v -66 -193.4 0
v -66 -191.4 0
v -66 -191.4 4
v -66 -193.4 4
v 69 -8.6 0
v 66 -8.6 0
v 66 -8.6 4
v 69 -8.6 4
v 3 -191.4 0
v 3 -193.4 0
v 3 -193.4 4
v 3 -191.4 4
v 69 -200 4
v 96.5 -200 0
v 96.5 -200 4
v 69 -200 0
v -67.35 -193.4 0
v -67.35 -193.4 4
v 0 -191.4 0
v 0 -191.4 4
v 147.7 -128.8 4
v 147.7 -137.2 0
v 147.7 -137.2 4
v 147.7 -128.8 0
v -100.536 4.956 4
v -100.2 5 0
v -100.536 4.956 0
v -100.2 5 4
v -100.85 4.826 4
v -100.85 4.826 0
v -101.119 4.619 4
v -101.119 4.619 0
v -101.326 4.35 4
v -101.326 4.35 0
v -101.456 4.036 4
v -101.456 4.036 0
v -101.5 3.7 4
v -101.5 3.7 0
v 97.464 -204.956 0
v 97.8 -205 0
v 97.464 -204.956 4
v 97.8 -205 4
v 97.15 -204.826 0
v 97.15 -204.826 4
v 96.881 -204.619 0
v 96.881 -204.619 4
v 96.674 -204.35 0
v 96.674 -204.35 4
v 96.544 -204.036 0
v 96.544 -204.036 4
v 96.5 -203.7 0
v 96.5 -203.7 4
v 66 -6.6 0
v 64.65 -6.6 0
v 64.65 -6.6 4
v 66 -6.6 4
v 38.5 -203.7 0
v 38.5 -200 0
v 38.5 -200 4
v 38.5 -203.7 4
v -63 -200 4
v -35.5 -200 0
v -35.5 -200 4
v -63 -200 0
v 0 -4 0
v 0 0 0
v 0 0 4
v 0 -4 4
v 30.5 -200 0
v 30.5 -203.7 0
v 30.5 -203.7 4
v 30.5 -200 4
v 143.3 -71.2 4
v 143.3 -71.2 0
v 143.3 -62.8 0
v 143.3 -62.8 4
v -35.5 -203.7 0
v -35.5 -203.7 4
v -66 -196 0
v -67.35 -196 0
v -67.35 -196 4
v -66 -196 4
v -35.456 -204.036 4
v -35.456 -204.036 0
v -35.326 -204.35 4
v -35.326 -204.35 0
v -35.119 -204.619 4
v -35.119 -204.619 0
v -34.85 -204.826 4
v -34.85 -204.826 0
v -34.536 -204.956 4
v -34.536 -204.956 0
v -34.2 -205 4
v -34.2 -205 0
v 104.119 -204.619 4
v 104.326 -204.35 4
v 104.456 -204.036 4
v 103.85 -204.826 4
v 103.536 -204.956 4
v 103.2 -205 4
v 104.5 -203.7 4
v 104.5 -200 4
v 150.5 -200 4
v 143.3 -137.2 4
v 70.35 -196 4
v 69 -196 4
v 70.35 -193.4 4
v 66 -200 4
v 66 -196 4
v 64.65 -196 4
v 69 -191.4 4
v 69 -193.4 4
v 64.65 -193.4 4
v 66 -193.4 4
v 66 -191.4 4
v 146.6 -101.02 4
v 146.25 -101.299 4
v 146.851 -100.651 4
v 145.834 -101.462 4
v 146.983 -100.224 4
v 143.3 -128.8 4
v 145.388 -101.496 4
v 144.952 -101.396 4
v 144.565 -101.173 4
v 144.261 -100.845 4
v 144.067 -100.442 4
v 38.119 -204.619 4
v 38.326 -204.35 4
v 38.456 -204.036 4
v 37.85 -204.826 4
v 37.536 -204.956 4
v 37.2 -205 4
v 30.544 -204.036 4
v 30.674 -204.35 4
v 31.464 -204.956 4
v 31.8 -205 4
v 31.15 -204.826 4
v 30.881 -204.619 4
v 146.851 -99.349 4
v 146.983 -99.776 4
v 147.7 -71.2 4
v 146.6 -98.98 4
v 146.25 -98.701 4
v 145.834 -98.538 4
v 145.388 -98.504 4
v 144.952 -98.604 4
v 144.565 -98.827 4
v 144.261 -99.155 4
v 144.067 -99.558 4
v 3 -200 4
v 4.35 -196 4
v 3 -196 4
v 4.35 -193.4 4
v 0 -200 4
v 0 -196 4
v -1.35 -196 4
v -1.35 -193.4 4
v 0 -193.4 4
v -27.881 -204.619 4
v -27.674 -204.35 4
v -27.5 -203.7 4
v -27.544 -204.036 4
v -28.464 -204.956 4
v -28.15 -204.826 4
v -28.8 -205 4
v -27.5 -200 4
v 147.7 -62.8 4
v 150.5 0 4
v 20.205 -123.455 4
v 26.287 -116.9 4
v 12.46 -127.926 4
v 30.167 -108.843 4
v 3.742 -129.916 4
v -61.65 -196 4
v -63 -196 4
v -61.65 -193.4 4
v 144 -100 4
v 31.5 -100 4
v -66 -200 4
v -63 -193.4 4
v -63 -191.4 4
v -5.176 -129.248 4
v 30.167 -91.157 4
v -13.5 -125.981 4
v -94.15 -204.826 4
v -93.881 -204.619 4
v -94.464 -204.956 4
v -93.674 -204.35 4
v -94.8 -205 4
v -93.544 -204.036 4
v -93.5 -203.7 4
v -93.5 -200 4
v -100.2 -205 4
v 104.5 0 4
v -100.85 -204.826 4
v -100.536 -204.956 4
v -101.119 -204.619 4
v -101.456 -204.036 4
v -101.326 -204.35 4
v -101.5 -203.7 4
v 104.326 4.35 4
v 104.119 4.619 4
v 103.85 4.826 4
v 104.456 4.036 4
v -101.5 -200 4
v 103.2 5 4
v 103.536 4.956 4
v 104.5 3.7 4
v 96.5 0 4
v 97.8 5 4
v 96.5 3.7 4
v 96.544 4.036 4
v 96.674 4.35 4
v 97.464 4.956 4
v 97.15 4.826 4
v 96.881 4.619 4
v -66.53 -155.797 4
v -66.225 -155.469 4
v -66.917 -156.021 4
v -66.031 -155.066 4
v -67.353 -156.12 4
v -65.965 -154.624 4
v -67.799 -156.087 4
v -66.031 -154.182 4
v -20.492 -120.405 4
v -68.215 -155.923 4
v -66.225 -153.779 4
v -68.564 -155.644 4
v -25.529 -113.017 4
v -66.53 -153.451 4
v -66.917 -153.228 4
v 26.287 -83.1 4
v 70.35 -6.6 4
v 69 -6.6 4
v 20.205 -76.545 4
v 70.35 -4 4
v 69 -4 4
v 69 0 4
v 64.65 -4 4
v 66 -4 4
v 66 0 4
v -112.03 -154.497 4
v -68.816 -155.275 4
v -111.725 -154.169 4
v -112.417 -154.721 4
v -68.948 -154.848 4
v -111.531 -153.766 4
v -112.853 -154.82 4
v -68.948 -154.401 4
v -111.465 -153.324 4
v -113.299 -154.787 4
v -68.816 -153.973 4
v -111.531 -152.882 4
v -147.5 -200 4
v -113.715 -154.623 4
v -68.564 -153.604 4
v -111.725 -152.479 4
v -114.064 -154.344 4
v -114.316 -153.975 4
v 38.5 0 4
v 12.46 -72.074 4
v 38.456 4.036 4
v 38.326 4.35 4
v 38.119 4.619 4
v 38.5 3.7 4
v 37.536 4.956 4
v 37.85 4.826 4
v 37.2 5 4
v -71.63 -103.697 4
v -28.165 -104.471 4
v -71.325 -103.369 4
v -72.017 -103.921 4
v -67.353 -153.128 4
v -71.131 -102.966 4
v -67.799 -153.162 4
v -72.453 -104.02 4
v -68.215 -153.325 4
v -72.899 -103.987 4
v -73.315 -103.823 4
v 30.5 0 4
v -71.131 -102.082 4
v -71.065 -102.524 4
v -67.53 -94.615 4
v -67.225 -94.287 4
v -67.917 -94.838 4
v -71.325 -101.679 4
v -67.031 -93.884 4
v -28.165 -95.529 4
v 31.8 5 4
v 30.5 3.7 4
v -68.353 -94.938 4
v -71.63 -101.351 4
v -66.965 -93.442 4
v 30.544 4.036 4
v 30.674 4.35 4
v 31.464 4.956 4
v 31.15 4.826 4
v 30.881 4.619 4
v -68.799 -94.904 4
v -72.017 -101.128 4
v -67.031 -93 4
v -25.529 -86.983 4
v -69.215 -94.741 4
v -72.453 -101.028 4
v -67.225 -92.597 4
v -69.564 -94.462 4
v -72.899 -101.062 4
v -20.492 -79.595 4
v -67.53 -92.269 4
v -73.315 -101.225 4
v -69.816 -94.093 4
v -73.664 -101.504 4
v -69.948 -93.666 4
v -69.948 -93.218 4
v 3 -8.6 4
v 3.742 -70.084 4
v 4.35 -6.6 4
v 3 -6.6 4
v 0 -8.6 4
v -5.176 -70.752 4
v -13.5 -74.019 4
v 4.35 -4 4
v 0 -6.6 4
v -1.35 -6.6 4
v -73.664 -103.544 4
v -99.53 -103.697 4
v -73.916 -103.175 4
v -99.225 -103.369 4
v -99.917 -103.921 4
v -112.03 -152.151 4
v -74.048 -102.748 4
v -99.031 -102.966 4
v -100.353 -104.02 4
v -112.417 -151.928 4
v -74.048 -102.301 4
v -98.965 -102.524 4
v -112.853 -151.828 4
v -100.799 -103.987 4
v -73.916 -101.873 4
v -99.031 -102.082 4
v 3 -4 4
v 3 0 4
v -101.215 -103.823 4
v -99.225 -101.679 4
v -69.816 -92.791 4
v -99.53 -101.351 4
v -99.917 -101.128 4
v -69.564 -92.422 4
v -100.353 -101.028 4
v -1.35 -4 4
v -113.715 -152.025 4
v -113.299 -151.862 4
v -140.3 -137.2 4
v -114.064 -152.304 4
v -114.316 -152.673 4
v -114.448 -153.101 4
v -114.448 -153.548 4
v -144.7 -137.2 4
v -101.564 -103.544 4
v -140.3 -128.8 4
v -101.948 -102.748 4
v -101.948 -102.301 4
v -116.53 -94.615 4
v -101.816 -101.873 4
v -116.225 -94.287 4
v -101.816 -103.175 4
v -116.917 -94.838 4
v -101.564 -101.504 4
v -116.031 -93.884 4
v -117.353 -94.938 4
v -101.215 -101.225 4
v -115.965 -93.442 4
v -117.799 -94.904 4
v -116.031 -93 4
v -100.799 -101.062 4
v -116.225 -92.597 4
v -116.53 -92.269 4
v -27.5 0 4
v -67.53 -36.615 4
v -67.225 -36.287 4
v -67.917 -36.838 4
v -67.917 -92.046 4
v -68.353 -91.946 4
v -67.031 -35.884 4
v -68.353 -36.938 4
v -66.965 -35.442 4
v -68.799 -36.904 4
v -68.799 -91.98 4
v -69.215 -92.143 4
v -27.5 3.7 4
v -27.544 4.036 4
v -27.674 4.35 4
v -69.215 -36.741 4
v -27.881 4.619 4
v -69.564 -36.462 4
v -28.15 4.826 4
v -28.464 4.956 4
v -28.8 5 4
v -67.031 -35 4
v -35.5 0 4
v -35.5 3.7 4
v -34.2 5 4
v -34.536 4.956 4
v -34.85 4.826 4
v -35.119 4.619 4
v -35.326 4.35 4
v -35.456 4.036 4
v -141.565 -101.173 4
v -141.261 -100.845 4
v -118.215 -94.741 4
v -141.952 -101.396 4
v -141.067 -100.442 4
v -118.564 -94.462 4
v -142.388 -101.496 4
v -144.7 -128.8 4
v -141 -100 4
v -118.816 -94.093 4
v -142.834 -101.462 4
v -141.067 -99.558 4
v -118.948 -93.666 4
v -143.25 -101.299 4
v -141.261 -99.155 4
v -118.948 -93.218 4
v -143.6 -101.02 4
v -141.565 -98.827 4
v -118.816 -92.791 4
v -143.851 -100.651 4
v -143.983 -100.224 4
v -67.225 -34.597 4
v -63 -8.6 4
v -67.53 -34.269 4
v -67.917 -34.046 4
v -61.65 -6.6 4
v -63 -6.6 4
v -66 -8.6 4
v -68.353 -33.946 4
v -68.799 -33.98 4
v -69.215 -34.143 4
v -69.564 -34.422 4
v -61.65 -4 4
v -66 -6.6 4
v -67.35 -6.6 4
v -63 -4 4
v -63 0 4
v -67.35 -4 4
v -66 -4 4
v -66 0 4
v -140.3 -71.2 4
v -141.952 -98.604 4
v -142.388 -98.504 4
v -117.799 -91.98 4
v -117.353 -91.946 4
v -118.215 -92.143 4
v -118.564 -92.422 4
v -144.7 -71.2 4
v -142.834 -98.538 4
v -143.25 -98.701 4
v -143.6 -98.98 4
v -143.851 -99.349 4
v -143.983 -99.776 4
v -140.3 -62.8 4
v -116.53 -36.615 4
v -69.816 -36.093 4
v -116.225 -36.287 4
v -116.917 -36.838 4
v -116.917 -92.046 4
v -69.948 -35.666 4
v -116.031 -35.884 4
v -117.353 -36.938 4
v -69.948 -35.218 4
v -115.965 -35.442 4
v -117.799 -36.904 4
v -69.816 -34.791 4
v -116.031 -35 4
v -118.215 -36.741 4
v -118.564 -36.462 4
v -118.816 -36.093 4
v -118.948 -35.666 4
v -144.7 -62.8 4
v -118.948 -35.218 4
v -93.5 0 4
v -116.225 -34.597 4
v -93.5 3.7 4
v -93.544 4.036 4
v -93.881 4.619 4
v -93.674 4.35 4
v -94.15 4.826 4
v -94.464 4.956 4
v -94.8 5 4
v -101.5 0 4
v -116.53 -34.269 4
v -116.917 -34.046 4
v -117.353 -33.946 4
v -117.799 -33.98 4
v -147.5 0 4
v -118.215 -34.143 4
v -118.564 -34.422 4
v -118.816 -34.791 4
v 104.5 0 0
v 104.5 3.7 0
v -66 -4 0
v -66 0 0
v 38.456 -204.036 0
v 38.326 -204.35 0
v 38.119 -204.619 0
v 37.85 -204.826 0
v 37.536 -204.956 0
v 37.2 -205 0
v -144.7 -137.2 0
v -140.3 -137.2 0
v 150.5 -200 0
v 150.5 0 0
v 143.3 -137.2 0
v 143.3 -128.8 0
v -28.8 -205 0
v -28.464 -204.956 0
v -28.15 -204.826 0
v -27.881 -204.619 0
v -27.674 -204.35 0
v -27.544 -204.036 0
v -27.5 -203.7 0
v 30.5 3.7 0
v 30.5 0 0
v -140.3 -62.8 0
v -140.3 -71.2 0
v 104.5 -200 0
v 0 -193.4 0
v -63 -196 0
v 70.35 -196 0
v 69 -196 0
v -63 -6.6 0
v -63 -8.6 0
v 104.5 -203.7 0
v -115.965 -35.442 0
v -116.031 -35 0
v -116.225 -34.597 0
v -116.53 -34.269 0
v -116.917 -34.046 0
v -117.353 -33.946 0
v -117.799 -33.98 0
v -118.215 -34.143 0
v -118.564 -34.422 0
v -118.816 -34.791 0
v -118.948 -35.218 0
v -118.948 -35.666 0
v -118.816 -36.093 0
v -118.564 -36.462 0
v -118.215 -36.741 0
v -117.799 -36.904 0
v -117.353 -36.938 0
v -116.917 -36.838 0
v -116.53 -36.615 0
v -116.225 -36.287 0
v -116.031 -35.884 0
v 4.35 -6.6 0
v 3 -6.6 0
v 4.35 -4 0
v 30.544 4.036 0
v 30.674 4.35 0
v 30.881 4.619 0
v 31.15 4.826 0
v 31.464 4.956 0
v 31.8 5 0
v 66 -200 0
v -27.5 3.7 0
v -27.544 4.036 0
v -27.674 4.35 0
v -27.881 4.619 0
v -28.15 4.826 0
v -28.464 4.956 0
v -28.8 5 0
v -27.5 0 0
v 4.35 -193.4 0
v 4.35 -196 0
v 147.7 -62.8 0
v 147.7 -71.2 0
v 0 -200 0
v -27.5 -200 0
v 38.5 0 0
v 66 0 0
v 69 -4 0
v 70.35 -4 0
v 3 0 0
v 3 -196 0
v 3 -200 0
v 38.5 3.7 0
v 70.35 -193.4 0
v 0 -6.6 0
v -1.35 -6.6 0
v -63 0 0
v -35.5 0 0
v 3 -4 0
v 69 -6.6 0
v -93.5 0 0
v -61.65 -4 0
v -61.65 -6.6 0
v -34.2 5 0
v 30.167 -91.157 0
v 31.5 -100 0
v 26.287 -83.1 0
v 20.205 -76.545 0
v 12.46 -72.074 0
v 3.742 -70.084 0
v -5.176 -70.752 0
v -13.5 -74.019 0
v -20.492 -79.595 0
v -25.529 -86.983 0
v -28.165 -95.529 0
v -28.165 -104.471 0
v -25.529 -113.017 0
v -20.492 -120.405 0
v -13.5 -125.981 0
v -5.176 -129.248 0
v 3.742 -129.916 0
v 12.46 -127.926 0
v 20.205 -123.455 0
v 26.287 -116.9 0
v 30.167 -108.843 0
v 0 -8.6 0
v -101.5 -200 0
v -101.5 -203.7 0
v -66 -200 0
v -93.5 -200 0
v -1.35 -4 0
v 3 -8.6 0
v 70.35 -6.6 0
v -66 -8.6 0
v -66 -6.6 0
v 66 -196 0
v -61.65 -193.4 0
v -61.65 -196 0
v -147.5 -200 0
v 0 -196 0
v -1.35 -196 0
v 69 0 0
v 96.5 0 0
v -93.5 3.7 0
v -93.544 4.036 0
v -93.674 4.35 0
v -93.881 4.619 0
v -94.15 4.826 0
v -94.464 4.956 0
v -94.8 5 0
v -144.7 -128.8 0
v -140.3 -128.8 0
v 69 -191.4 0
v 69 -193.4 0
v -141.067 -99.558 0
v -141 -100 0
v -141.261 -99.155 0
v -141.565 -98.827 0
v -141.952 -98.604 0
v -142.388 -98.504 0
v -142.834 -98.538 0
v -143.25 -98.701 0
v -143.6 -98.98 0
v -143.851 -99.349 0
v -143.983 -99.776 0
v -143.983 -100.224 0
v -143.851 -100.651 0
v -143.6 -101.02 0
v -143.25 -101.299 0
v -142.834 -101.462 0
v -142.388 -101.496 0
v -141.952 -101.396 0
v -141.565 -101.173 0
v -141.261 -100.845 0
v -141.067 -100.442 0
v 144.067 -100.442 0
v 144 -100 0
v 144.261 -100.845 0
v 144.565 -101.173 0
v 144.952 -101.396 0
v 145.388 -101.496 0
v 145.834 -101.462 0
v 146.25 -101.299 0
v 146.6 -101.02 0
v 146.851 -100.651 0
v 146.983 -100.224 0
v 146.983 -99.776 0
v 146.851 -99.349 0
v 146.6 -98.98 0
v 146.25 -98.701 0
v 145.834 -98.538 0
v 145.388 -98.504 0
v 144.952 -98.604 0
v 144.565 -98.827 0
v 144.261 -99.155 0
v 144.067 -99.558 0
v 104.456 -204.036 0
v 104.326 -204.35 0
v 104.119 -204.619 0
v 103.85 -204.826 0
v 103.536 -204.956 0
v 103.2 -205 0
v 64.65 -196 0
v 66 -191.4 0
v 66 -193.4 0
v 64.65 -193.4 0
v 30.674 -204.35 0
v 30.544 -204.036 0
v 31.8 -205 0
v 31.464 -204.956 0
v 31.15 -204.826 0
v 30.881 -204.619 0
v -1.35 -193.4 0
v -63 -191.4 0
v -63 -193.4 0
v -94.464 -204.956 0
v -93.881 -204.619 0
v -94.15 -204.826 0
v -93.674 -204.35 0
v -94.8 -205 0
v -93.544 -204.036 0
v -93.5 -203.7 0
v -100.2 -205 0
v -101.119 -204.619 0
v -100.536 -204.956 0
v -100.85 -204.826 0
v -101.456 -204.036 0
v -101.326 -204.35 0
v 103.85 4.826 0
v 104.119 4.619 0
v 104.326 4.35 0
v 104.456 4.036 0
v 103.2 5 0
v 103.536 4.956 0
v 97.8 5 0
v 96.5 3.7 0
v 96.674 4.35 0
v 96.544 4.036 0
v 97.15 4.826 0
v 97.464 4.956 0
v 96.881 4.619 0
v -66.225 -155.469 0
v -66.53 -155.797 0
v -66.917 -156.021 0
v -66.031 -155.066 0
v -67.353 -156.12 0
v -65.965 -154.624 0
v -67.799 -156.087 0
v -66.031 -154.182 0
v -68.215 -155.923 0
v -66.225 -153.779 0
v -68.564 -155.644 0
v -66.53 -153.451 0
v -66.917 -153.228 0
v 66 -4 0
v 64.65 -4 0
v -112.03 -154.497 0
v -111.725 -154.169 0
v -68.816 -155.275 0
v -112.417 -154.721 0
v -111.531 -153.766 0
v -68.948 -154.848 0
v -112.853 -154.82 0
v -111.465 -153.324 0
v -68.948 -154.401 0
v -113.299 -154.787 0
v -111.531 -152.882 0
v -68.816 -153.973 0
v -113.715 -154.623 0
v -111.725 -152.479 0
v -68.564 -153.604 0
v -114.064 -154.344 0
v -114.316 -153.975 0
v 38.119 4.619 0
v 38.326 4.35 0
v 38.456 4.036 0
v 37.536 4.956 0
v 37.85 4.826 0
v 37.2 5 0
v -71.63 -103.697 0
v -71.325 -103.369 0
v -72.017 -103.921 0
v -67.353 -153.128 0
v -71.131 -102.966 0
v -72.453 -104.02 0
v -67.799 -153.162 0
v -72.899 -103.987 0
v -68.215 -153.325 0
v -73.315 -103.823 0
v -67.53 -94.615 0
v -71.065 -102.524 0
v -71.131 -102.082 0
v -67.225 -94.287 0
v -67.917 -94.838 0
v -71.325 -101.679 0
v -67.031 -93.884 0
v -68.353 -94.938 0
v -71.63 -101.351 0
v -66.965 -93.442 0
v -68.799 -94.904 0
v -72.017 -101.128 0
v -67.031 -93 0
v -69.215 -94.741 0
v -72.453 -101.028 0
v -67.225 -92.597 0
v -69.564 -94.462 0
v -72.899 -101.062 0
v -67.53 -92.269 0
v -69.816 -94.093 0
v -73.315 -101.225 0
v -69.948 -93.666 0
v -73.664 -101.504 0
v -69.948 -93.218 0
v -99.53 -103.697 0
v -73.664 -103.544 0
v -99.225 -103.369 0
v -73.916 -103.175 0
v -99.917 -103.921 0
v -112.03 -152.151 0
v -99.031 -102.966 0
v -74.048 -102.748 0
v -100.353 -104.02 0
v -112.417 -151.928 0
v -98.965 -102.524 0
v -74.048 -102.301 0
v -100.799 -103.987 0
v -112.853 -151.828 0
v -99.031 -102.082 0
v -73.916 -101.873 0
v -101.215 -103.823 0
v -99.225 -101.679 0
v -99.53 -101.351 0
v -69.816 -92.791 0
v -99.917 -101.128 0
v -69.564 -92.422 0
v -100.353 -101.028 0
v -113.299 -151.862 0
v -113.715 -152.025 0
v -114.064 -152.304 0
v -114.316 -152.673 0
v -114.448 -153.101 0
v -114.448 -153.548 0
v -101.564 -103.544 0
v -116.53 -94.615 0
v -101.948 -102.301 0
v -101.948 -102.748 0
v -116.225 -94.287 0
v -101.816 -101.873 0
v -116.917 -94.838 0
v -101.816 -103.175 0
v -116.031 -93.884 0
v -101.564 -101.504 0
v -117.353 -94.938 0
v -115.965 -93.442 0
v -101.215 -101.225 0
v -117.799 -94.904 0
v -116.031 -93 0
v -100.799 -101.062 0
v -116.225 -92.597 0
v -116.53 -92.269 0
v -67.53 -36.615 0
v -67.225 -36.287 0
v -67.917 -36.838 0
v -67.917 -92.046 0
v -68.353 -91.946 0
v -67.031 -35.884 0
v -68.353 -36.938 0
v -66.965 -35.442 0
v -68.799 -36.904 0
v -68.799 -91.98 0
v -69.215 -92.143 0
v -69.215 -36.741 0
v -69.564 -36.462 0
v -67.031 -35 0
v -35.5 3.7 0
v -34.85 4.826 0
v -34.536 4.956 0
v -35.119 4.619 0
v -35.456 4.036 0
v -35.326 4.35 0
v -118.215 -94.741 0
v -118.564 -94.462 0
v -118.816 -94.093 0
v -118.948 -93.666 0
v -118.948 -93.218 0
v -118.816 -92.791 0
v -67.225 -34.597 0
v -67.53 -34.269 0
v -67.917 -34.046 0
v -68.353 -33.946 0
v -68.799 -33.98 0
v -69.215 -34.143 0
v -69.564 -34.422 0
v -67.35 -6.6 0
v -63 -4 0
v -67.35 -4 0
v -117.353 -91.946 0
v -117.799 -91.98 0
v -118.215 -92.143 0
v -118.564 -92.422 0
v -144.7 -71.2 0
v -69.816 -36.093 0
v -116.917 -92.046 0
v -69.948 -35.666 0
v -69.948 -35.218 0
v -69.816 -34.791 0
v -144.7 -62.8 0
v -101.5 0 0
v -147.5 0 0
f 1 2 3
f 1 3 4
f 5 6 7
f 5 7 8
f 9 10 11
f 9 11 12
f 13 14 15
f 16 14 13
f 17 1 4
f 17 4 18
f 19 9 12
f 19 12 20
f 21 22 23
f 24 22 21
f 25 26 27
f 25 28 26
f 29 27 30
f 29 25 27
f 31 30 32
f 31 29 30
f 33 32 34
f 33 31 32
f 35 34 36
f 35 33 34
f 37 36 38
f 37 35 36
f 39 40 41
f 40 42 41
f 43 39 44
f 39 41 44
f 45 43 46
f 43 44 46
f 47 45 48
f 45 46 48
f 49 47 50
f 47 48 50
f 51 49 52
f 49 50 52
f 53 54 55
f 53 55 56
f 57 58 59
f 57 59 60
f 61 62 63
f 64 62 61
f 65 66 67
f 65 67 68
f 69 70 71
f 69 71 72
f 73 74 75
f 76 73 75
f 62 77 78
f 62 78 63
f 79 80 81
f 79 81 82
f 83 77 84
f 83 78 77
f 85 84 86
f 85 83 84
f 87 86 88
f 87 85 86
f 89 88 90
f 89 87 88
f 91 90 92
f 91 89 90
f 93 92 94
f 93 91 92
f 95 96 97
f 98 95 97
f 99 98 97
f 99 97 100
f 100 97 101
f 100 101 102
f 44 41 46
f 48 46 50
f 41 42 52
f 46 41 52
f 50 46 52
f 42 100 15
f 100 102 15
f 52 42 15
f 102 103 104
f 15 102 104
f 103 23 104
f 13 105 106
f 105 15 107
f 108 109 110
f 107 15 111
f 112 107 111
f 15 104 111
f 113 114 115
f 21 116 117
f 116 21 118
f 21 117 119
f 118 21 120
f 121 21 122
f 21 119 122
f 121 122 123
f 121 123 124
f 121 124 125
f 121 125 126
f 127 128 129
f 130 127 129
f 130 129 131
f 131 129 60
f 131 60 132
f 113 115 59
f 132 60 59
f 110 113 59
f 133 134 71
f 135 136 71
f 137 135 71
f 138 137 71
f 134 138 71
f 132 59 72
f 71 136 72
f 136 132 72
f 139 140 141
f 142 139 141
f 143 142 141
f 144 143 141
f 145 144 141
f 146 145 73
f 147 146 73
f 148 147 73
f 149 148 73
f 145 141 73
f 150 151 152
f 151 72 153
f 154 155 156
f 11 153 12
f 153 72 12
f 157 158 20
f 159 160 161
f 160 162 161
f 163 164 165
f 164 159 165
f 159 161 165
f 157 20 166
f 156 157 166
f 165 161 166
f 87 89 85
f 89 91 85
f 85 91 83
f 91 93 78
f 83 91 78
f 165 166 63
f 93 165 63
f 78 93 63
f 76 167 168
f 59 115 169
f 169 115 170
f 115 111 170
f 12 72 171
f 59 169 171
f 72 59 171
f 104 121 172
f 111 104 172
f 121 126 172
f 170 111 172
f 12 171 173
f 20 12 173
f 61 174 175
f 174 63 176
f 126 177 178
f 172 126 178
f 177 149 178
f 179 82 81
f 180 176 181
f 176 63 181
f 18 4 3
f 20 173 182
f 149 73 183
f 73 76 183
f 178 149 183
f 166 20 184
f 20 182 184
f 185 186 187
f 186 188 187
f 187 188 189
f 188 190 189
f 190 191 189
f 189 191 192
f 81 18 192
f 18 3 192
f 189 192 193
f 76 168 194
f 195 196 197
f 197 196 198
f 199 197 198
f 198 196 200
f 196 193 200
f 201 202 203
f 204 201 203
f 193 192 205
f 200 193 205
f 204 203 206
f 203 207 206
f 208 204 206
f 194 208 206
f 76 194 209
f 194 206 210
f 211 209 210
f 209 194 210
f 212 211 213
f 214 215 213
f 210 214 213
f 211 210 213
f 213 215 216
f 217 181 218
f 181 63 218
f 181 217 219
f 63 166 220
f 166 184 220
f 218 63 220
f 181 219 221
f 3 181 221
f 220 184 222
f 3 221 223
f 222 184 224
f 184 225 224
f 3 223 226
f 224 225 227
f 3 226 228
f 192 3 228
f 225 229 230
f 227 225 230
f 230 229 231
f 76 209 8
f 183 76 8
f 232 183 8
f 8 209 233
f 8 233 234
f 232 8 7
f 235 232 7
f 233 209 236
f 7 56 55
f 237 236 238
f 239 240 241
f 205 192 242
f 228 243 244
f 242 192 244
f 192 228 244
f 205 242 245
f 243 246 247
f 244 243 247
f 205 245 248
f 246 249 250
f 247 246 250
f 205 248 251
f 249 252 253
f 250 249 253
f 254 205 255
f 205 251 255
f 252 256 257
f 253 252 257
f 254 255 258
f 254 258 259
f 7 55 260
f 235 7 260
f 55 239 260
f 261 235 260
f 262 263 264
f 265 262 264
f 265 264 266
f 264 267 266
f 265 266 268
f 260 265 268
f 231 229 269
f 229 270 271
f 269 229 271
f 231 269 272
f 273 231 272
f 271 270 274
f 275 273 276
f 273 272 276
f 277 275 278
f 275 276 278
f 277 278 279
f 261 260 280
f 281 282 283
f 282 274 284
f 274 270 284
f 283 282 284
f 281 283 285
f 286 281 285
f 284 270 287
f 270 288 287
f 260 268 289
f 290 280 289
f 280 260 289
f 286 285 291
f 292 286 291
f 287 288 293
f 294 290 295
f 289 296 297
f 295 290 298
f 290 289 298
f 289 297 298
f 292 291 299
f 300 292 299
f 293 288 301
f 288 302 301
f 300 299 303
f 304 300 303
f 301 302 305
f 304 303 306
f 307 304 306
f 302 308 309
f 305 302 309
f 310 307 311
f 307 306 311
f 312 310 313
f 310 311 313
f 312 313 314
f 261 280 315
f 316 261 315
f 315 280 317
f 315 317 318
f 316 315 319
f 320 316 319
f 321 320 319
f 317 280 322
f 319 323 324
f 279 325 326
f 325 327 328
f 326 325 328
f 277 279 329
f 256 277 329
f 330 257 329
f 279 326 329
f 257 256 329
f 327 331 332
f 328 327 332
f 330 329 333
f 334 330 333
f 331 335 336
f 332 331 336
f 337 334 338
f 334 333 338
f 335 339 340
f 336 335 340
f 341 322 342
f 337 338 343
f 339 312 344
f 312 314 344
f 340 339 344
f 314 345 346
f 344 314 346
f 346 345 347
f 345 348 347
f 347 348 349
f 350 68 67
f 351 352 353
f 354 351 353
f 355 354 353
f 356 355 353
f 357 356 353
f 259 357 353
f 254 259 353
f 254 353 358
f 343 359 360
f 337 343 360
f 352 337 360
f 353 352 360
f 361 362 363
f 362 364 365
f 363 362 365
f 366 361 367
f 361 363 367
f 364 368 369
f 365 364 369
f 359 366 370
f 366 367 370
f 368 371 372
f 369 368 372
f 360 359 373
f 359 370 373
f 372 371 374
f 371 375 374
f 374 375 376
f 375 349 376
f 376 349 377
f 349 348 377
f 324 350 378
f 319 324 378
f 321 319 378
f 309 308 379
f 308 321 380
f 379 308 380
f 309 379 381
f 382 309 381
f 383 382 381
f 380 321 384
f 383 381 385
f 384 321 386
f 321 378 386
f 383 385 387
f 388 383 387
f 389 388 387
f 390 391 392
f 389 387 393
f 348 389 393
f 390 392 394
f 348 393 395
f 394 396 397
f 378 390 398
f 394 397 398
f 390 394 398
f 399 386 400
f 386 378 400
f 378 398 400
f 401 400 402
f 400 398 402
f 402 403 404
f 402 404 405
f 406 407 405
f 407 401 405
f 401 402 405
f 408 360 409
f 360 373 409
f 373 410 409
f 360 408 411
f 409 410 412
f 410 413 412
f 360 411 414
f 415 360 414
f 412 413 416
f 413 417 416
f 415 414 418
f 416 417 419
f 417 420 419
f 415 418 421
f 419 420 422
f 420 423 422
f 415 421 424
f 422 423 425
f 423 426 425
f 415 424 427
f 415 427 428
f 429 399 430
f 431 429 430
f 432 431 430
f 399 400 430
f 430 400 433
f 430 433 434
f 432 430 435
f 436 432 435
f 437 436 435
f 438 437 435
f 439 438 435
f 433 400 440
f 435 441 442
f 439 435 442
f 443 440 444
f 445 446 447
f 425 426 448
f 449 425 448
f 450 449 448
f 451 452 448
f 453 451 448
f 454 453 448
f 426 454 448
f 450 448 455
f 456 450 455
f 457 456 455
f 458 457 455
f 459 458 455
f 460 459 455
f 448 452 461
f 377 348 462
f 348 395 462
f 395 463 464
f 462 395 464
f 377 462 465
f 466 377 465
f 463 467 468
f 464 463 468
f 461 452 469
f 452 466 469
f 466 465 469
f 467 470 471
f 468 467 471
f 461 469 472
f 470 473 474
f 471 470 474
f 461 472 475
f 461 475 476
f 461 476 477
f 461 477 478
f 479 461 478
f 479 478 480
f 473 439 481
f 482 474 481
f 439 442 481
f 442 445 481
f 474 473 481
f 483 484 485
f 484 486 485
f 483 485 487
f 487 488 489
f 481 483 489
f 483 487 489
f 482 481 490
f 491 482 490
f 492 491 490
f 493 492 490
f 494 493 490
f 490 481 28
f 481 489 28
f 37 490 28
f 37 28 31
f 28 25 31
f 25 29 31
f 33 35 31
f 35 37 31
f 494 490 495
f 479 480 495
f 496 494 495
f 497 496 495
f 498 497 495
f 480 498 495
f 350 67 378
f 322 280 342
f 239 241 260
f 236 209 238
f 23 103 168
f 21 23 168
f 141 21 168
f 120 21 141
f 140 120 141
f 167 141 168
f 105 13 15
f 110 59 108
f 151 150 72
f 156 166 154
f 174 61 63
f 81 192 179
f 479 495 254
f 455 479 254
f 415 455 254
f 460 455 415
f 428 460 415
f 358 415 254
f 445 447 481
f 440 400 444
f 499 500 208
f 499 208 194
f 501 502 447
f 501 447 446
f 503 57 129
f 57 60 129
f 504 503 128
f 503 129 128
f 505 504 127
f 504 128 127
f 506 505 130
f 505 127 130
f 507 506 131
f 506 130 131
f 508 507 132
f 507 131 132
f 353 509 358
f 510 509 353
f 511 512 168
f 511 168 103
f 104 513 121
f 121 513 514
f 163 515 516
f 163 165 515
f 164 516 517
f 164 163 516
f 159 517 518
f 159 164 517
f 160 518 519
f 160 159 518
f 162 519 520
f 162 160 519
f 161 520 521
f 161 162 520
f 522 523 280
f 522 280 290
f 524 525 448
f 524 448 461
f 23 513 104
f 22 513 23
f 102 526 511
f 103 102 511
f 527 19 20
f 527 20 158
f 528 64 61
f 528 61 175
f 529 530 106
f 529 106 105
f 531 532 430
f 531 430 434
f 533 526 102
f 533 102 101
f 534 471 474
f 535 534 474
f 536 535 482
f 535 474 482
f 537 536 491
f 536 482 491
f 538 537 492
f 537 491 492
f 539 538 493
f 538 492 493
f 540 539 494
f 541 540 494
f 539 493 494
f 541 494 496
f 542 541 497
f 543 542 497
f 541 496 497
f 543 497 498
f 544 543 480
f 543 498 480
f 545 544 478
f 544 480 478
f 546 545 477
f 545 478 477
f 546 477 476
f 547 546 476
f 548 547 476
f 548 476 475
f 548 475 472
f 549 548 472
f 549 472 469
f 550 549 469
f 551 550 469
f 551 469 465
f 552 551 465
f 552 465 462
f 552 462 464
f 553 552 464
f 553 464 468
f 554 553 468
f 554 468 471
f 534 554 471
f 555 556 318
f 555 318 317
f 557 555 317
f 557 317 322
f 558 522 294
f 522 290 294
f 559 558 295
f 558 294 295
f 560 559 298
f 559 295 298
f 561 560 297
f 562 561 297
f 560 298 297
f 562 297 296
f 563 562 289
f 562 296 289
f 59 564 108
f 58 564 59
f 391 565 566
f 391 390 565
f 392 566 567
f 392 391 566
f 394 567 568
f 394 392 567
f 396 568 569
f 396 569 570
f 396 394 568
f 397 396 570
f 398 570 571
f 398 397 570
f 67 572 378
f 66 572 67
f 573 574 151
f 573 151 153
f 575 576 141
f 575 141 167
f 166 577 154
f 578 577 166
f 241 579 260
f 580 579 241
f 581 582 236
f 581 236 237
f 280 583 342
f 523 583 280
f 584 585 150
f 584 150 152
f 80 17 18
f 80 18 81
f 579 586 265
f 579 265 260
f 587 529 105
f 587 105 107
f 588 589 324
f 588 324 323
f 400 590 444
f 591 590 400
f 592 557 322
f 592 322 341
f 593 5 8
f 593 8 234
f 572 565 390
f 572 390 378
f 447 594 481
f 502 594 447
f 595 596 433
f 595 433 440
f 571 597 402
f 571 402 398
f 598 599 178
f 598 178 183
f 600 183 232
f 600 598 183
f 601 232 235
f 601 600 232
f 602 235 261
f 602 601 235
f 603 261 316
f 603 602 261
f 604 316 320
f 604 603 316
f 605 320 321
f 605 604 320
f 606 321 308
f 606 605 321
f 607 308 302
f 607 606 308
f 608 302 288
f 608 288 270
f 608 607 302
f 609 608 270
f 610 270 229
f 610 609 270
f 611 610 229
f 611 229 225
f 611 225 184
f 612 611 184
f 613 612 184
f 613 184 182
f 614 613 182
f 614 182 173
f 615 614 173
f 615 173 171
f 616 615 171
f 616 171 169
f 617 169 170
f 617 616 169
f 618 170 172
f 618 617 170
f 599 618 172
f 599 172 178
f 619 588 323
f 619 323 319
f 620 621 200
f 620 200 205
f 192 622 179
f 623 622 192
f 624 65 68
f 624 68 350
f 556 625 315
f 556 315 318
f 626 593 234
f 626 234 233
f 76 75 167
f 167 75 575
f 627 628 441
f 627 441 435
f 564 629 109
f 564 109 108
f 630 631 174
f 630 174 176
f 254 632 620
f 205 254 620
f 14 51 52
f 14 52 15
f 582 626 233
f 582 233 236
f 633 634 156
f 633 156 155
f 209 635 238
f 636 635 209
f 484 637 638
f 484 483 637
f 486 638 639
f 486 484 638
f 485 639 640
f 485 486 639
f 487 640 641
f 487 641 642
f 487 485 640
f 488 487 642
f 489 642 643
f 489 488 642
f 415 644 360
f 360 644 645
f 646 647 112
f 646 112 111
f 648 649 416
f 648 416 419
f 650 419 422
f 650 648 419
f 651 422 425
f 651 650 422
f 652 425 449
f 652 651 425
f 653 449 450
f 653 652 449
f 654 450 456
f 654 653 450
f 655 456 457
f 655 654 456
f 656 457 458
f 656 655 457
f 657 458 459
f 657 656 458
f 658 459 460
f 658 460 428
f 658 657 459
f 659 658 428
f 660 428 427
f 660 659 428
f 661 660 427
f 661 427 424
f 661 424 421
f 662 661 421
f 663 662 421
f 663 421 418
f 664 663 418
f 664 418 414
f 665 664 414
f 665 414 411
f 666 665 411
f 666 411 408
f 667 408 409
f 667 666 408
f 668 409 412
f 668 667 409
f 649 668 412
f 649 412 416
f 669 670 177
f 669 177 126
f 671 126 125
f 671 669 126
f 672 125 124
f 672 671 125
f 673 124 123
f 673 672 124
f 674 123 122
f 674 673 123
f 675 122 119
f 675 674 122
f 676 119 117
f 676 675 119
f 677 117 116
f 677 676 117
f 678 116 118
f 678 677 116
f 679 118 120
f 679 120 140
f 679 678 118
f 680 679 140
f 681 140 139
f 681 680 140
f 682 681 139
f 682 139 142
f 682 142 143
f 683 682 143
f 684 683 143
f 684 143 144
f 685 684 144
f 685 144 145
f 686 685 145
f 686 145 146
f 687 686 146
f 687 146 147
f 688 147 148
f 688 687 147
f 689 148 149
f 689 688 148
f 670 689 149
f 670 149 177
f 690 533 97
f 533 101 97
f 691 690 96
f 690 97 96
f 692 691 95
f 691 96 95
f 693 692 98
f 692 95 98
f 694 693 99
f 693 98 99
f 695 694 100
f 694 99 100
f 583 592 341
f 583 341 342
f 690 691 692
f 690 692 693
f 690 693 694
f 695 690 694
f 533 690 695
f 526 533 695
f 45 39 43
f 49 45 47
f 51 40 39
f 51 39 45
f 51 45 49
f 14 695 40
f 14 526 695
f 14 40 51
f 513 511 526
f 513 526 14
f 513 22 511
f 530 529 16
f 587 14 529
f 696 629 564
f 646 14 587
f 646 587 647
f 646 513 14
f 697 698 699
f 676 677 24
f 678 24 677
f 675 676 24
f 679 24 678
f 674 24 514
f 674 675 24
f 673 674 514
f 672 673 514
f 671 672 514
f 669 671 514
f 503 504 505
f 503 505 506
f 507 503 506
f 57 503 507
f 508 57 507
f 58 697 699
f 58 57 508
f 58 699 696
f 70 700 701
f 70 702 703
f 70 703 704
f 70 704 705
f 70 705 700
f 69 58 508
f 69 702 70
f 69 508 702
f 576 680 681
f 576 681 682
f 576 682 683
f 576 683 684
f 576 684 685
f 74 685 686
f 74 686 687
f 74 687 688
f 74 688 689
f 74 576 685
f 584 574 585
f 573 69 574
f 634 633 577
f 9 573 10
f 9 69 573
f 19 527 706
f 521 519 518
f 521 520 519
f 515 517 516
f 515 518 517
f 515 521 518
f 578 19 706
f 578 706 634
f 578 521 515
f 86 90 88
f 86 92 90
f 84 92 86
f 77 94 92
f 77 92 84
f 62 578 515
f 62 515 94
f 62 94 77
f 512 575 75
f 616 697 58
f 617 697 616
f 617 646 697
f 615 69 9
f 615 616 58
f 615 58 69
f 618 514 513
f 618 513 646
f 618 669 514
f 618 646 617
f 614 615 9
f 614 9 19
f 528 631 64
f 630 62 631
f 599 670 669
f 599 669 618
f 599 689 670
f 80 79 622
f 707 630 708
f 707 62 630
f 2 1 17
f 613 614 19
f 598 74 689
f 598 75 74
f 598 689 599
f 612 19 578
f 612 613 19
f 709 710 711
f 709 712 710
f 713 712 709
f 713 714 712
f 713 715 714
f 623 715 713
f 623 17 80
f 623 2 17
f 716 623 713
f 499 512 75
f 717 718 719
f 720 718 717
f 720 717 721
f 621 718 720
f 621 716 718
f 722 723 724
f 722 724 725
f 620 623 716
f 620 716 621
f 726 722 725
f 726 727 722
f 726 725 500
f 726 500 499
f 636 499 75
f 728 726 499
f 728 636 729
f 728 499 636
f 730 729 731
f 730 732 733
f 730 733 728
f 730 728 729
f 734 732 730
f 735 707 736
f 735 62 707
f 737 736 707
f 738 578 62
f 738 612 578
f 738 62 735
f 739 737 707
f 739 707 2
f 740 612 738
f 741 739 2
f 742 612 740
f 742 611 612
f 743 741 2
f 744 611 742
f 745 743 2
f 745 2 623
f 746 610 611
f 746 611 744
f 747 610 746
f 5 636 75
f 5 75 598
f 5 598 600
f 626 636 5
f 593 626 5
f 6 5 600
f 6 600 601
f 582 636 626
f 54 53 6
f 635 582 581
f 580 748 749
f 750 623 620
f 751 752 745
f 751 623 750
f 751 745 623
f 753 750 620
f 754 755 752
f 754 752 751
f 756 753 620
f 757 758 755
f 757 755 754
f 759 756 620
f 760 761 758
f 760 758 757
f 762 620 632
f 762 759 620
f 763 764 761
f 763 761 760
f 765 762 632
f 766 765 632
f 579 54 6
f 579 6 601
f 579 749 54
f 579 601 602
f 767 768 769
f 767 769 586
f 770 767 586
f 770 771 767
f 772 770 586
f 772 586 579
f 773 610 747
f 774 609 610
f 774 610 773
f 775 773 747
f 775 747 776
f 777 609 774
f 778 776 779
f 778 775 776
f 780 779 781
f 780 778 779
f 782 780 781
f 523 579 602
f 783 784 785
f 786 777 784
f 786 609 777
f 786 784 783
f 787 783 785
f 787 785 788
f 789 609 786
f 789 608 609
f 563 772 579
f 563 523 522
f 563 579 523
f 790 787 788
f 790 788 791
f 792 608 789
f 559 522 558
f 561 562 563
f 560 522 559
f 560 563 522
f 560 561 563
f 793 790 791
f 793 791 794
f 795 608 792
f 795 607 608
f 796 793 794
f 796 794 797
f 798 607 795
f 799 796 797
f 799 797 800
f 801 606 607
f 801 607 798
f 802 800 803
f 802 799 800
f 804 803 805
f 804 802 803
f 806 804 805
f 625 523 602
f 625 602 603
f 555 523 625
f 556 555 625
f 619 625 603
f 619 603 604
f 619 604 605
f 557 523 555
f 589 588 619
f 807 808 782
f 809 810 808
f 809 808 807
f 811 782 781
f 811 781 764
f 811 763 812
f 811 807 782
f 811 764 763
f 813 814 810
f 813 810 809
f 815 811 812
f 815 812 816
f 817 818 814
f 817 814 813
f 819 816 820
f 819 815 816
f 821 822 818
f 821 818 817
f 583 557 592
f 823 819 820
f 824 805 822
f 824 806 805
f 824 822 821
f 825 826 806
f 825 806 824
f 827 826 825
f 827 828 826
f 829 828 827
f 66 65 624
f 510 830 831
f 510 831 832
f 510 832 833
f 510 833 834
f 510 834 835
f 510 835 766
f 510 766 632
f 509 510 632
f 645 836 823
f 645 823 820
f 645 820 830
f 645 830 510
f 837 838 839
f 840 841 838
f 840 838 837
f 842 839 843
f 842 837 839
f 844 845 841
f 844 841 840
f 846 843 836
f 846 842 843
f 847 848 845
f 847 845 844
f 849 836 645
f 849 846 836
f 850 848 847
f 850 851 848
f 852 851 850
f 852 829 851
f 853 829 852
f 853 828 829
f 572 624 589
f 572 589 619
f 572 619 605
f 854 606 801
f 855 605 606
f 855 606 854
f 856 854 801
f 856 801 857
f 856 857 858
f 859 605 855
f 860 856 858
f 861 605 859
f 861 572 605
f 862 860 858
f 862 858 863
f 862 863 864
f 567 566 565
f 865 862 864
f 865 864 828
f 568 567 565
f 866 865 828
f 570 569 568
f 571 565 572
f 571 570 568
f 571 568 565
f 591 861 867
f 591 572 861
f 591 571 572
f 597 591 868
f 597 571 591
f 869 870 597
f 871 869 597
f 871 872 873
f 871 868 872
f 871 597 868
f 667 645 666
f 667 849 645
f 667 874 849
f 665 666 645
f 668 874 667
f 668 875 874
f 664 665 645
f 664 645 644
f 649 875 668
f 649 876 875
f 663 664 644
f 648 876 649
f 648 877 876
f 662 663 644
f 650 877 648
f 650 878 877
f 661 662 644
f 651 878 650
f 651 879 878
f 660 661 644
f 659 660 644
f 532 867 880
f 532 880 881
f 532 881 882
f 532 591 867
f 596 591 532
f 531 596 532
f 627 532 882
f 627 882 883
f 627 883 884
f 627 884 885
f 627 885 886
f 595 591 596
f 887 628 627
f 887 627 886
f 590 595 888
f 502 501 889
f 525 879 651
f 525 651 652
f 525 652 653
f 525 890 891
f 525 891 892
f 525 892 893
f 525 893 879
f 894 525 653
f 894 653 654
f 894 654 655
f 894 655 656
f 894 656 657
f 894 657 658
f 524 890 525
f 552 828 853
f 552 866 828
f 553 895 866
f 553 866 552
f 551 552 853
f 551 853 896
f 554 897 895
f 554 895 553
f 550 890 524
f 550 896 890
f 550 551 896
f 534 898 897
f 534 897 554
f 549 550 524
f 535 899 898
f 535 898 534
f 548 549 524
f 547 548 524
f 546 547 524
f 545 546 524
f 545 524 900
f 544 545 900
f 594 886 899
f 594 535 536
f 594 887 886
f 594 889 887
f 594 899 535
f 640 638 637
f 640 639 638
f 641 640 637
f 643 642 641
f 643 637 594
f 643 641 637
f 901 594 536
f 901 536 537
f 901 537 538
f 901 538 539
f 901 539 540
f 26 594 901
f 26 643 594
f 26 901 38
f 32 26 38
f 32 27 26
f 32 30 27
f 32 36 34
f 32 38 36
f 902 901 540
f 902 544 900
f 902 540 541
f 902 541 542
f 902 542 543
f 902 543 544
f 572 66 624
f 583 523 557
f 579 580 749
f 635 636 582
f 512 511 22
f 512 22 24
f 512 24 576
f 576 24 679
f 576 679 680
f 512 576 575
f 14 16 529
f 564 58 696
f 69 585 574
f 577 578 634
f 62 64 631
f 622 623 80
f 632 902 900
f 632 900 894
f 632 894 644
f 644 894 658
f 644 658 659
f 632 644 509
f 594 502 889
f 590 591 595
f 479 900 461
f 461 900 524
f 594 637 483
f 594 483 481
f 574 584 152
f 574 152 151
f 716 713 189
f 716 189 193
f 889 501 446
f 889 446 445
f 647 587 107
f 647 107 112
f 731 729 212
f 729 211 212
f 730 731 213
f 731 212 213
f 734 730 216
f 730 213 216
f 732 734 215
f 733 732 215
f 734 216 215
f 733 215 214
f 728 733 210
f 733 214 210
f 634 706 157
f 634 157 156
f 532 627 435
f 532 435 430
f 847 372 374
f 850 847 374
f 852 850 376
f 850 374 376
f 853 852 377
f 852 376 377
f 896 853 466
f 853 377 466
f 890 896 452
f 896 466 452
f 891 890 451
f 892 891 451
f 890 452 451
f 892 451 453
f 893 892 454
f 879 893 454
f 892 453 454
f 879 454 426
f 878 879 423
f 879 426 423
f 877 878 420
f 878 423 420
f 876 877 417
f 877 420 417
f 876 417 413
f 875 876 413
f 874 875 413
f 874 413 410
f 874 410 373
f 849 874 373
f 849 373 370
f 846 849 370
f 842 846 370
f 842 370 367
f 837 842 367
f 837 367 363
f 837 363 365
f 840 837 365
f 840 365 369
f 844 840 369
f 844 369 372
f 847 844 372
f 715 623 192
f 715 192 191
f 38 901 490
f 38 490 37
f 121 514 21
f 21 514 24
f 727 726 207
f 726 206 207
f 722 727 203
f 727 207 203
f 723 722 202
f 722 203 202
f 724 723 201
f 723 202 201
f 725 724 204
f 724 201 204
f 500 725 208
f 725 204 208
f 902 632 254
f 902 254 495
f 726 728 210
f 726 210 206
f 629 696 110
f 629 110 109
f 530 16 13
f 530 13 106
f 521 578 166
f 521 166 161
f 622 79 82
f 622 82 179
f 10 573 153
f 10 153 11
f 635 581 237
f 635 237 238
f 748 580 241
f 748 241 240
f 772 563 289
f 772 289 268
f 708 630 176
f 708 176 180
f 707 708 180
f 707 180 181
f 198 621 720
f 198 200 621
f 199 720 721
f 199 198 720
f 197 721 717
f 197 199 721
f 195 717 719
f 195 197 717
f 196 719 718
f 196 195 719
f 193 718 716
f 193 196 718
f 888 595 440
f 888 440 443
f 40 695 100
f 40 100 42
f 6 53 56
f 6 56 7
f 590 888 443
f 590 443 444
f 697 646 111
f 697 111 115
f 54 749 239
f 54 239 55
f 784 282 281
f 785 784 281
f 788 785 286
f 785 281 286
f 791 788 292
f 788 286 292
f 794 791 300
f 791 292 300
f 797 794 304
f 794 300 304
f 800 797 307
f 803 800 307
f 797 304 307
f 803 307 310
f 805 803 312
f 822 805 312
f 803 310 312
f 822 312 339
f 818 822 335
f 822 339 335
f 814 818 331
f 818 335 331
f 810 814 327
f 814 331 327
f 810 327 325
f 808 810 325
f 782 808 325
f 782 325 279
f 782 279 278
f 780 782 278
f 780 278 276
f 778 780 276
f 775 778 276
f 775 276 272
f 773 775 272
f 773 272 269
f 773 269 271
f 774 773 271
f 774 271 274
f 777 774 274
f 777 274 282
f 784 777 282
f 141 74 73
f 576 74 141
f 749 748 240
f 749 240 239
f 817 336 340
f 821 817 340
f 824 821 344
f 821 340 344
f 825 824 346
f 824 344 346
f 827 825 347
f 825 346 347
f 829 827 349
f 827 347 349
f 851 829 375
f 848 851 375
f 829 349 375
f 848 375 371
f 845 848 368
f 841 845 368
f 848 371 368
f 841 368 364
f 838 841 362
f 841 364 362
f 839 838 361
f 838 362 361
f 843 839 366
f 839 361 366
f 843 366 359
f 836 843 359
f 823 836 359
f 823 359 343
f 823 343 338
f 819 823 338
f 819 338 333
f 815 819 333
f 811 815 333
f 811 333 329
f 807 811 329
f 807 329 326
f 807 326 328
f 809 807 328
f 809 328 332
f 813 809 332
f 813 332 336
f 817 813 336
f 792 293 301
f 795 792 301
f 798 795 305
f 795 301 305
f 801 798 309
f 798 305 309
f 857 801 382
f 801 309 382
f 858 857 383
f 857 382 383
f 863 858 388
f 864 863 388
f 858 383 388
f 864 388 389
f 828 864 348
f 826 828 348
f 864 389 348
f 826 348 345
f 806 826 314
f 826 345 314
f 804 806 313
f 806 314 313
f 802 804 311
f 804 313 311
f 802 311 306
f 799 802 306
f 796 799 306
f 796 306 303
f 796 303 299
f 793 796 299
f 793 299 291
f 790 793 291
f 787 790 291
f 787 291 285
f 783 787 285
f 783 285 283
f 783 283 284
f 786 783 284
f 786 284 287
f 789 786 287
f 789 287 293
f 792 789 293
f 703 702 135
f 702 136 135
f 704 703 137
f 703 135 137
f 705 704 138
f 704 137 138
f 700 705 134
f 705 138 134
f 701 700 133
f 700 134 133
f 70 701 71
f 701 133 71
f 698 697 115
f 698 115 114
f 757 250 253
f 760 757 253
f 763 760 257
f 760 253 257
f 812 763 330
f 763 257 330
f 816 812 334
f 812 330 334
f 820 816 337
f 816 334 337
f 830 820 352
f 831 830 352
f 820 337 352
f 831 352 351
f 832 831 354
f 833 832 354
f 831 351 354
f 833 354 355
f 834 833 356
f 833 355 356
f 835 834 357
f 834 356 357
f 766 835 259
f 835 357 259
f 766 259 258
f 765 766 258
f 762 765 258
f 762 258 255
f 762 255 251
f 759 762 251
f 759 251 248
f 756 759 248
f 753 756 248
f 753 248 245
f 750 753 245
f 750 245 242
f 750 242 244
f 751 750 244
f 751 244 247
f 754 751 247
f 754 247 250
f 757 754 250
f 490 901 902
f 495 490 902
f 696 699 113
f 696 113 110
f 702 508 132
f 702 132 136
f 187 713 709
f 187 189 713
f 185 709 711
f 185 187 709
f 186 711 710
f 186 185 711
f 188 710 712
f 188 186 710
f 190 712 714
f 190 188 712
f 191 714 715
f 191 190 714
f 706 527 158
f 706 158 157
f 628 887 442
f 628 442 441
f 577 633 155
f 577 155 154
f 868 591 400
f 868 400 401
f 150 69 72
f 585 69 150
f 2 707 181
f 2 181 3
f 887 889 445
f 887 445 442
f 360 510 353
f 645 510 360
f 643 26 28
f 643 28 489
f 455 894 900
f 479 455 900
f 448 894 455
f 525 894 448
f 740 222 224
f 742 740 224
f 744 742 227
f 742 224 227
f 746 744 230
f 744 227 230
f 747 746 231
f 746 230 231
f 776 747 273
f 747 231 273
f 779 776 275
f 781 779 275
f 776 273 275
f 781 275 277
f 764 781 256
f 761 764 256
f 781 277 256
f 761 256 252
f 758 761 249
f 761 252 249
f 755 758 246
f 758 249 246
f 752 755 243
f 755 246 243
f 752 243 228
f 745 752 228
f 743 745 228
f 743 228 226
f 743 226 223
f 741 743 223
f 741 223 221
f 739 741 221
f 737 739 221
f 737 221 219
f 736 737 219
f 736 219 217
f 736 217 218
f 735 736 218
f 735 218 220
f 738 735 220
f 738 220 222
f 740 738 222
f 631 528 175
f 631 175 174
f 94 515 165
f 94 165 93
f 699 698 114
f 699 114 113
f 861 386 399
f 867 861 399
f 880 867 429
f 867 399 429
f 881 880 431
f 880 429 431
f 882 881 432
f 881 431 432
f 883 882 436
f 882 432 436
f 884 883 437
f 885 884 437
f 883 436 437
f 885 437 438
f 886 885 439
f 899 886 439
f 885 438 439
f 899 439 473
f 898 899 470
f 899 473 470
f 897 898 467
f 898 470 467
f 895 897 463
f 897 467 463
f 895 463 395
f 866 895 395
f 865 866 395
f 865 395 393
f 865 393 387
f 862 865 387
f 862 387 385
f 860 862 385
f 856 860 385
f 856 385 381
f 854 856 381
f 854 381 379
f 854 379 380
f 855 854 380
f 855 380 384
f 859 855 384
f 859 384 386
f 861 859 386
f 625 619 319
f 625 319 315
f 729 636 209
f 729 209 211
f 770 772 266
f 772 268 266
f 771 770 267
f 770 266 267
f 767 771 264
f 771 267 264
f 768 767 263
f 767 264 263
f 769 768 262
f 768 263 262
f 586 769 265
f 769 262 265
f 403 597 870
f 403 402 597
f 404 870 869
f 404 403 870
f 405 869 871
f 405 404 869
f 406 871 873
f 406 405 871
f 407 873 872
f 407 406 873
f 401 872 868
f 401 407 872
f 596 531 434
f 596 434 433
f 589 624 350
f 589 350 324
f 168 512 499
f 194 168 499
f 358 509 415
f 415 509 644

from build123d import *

# Parameters (mm, degrees)
SKETCH_1_R          = 1.5
SKETCH_1_R_2        = 30
SKETCH_1_W          = 4.4
SKETCH_1_H          = 8.4
EXTRUDE_1_DEPTH     = 4
SKETCH_4_R          = 1.5
CUT_EXTRUDE_1_DEPTH = 10
FILLET_1_R          = 1.3


with BuildPart() as part:
    # 草图1 → 凸台-拉伸1 (new body)
    with BuildSketch(Plane.XY):
        Polygon((0, 0), (0, -4), (-1.35, -4), (-1.35, -6.6), (0, -6.6), (0, -8.6), (3, -8.6), (3, -6.6), (4.35, -6.6), (4.35, -4), (3, -4), (3, 0), (30.5, 0), (30.5, 5), (38.5, 5), (38.5, 0), (66, 0), (66, -4), (64.65, -4), (64.65, -6.6), (66, -6.6), (66, -8.6), (69, -8.6), (69, -6.6), (70.35, -6.6), (70.35, -4), (69, -4), (69, 0), (96.5, 0), (96.5, 5), (104.5, 5), (104.5, 0), (132, 0), (143.5, 0), (145.5, 0), (150.5, 0), (150.5, -200), (145.5, -200), (143.5, -200), (132, -200), (104.5, -200), (104.5, -205), (96.5, -205), (96.5, -200), (69, -200), (69, -196), (70.35, -196), (70.35, -193.4), (69, -193.4), (69, -191.4), (66, -191.4), (66, -193.4), (64.65, -193.4), (64.65, -196), (66, -196), (66, -200), (38.5, -200), (38.5, -205), (30.5, -205), (30.5, -200), (3, -200), (3, -196), (4.35, -196), (4.35, -193.4), (3, -193.4), (3, -191.4), (0, -191.4), (0, -193.4), (-1.35, -193.4), (-1.35, -196), (0, -196), (0, -200), (-27.5, -200), (-27.5, -205), (-35.5, -205), (-35.5, -200), (-63, -200), (-63, -196), (-61.65, -196), (-61.65, -193.4), (-63, -193.4), (-63, -191.4), (-66, -191.4), (-66, -193.4), (-67.35, -193.4), (-67.35, -196), (-66, -196), (-66, -200), (-93.5, -200), (-93.5, -205), (-101.5, -205), (-101.5, -200), (-129, -200), (-140.5, -200), (-142.5, -200), (-147.5, -200), (-147.5, 0), (-142.5, 0), (-140.5, 0), (-129, 0), (-101.5, 0), (-101.5, 5), (-93.5, 5), (-93.5, 0), (-66, 0), (-66, -4), (-67.35, -4), (-67.35, -6.6), (-66, -6.6), (-66, -8.6), (-63, -8.6), (-63, -6.6), (-61.65, -6.6), (-61.65, -4), (-63, -4), (-63, 0), (-35.5, 0), (-35.5, 5), (-27.5, 5), (-27.5, 0), align=None)
        with Locations((-142.5, -100)):
            Circle(SKETCH_1_R, mode=Mode.SUBTRACT)
        with Locations(Location((145.5, -100, 0), (0, 0, 180))):
            Circle(SKETCH_1_R, mode=Mode.SUBTRACT)
        with Locations((1.5, -100)):
            Circle(SKETCH_1_R_2, mode=Mode.SUBTRACT)
        with Locations((-142.5, -67)):
            Rectangle(SKETCH_1_W, SKETCH_1_H, mode=Mode.SUBTRACT)
        with Locations((-142.5, -133)):
            Rectangle(SKETCH_1_W, SKETCH_1_H, mode=Mode.SUBTRACT)
        with Locations((145.5, -133)):
            Rectangle(SKETCH_1_W, SKETCH_1_H, mode=Mode.SUBTRACT)
        with Locations((145.5, -67)):
            Rectangle(SKETCH_1_W, SKETCH_1_H, mode=Mode.SUBTRACT)
    extrude(amount=EXTRUDE_1_DEPTH)

    # 草图4 → 切除-拉伸1 (cut)
    with BuildSketch(Plane.XY.offset(4)):
        with Locations((-100.464854909, -102.524202067)):
            Circle(SKETCH_4_R)
        with Locations((-72.564854909, -102.524202067)):
            Circle(SKETCH_4_R)
        with Locations((-112.964854909, -153.324202067)):
            Circle(SKETCH_4_R)
        with Locations((-67.464854909, -154.624202067)):
            Circle(SKETCH_4_R)
        with Locations((-117.464854909, -35.441983185)):
            Circle(SKETCH_4_R)
        with Locations((-68.464854909, -35.441983185)):
            Circle(SKETCH_4_R)
        with Locations((-117.464854909, -93.441983185)):
            Circle(SKETCH_4_R)
        with Locations((-68.464854909, -93.441983185)):
            Circle(SKETCH_4_R)
    extrude(amount=-CUT_EXTRUDE_1_DEPTH, mode=Mode.SUBTRACT)

    # 圆角1
    fillet_1_edges = [part.edges().sort_by_distance(p)[0] for p in [
        (30.5, 5, 2),
        (38.5, 5, 2),
        (96.5, 5, 2),
        (104.5, 5, 2),
        (104.5, -205, 2),
        (96.5, -205, 2),
        (38.5, -205, 2),
        (30.5, -205, 2),
        (-27.5, -205, 2),
        (-35.5, -205, 2),
        (-93.5, -205, 2),
        (-101.5, -205, 2),
        (-101.5, 5, 2),
        (-93.5, 5, 2),
        (-35.5, 5, 2),
        (-27.5, 5, 2),
    ]]
    fillet(fillet_1_edges, radius=FILLET_1_R)


solid = part.part
